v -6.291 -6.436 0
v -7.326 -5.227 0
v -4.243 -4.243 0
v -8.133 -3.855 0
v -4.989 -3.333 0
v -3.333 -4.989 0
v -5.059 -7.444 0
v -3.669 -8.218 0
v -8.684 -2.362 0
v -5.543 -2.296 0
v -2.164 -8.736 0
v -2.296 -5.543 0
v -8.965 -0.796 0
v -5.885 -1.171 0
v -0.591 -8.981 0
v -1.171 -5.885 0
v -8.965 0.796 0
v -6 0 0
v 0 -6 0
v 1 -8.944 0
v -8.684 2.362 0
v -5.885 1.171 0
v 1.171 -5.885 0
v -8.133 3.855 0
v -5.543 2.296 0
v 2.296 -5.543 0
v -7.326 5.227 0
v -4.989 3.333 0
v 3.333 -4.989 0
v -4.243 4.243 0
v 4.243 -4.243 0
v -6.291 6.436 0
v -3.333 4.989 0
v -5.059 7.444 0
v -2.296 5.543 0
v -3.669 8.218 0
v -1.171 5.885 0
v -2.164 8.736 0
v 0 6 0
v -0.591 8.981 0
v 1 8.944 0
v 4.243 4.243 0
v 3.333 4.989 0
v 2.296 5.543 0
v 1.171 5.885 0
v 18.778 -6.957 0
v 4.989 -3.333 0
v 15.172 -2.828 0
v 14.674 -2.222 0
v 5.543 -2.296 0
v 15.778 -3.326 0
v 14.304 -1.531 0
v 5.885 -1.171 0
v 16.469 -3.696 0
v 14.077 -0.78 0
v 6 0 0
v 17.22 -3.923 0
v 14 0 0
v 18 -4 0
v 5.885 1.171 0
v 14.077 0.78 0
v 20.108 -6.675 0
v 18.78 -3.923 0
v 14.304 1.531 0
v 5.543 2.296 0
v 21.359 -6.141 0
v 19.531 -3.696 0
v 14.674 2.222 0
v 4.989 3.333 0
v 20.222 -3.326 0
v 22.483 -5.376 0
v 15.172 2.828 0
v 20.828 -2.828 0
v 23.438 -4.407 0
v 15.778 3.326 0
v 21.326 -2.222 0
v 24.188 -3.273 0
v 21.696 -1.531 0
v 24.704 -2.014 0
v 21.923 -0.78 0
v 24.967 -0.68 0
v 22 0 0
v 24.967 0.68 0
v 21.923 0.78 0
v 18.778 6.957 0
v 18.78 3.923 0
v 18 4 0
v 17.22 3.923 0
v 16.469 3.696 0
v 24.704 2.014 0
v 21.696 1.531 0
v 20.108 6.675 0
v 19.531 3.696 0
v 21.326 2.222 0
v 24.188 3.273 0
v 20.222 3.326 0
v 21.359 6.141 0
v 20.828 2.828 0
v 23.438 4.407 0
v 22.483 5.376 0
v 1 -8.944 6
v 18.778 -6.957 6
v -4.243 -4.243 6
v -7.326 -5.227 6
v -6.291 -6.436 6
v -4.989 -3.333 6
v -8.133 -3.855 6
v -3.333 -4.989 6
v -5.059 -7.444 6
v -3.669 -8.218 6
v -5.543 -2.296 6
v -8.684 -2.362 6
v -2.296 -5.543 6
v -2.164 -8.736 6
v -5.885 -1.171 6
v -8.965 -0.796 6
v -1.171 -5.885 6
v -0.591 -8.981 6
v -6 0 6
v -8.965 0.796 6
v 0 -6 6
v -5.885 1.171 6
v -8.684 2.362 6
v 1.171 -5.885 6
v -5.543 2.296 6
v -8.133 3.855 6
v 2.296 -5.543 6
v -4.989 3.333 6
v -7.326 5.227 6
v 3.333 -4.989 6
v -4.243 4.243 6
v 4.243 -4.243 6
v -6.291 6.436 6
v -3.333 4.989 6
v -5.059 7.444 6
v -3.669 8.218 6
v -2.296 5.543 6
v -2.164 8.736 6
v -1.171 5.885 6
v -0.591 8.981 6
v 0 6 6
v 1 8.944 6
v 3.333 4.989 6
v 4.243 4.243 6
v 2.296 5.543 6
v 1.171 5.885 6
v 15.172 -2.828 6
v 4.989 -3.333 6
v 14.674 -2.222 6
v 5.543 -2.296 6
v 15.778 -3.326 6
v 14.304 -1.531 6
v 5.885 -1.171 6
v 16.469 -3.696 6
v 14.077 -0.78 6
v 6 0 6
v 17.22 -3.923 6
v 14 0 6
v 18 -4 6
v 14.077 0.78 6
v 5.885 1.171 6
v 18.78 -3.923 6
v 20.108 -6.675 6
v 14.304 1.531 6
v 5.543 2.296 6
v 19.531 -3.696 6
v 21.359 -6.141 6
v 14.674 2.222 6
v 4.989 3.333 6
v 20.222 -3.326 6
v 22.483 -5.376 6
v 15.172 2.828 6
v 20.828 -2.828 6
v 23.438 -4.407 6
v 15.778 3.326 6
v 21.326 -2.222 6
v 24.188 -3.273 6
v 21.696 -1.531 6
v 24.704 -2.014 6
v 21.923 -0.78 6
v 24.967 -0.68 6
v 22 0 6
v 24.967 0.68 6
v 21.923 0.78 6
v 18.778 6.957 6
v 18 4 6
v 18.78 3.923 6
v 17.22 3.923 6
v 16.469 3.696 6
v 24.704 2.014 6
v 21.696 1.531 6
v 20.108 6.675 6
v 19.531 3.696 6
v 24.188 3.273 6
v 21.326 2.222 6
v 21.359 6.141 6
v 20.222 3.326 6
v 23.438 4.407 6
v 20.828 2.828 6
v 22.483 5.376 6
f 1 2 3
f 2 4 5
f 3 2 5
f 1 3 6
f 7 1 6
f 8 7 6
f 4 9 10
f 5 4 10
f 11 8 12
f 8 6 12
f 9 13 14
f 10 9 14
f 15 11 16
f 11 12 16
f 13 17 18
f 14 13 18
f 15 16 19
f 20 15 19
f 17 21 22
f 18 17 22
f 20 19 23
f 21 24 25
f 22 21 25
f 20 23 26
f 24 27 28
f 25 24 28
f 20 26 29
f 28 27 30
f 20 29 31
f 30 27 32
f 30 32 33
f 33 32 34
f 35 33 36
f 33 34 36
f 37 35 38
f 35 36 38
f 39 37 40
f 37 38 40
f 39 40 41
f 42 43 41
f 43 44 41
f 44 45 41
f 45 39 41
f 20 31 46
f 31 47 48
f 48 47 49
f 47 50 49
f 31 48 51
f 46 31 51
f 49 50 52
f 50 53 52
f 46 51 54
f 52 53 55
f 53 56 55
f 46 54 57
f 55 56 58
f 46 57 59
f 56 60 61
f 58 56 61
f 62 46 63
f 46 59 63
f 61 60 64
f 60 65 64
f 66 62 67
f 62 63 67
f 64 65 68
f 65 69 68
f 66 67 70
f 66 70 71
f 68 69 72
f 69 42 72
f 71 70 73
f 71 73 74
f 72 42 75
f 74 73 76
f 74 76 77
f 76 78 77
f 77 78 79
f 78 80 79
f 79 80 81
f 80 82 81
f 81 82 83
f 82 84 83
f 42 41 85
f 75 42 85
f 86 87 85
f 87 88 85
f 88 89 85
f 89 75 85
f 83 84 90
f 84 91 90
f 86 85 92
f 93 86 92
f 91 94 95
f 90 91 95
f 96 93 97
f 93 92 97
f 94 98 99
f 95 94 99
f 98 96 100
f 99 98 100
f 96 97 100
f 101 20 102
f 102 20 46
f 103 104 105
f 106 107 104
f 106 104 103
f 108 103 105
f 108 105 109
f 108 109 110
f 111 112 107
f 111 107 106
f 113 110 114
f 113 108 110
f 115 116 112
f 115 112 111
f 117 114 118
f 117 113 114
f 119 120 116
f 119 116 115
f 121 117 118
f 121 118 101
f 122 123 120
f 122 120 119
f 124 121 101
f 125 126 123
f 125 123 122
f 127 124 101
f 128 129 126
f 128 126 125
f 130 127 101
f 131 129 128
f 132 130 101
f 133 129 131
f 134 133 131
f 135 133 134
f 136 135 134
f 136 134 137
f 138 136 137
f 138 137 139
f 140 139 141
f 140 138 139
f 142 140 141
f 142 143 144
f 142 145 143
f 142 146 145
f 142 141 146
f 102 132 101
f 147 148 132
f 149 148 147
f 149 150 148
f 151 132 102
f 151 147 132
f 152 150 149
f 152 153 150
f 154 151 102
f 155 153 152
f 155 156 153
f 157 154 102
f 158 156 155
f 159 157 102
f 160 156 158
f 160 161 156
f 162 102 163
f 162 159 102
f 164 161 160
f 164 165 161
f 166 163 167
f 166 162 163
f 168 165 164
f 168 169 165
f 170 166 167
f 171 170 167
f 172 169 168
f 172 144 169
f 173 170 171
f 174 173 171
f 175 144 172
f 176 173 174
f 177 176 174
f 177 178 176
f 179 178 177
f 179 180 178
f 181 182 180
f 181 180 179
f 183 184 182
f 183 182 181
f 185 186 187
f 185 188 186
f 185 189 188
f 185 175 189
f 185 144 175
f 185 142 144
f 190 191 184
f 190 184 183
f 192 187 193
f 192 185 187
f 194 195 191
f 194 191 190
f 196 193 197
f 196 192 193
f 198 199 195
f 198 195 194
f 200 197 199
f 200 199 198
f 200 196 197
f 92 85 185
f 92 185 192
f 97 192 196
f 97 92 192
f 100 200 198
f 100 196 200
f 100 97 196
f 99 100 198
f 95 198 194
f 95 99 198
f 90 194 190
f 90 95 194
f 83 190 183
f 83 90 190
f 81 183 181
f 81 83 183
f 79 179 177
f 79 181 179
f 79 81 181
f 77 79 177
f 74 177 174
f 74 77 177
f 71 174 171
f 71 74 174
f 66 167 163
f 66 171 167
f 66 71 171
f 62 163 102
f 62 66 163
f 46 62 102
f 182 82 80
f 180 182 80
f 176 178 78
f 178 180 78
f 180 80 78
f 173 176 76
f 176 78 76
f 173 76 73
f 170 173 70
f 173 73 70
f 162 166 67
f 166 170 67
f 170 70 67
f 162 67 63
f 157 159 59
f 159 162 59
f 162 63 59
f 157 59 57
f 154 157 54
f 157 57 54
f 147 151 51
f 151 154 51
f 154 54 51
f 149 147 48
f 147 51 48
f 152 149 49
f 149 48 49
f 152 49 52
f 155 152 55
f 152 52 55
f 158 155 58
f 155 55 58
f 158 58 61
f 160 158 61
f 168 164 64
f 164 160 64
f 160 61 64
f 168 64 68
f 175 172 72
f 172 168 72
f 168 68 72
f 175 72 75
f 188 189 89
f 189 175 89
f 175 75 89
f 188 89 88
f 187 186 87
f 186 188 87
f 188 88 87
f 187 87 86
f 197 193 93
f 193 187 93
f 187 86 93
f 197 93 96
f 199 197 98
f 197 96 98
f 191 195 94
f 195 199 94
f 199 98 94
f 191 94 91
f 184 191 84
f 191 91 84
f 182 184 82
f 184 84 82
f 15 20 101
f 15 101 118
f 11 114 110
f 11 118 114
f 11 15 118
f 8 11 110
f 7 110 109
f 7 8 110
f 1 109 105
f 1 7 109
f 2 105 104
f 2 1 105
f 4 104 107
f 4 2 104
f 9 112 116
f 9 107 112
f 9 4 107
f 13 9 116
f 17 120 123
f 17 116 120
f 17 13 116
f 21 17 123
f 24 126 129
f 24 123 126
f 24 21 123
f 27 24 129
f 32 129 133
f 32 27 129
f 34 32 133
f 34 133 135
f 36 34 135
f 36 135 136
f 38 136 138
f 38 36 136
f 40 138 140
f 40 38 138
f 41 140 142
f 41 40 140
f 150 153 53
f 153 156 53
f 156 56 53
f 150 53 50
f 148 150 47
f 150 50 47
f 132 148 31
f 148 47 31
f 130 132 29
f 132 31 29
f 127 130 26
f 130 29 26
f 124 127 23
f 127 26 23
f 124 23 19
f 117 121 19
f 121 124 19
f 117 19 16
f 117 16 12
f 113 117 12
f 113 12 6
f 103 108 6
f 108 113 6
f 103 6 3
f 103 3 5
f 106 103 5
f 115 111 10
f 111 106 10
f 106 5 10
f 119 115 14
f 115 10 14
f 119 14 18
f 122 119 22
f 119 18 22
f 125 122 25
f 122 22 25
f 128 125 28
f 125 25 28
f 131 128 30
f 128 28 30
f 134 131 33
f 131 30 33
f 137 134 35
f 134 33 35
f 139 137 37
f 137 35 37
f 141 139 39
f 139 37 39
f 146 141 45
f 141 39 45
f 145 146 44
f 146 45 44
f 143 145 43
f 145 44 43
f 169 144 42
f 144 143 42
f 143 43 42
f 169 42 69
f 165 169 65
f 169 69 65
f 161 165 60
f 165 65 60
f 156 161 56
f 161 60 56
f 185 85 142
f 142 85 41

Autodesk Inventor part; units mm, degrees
ref_plane "YZ Plane" through (0, 0, 0) normal (1, 0, 0) x (0, 1, 0)
ref_plane "XZ Plane" through (0, 0, 0) normal (0, 1, 0) x (-1, 0, 0)
ref_plane "XY Plane" through (0, 0, 0) normal (0, 0, 1) x (1, 0, 0)
sketch "Эскиз1" plane through (0, 0, 0) normal (0, 0, 1) x (1, 0, 0)
  circle A0 centre (0, 0) radius 6
  circle A1 centre (18, 0) radius 4
  line L0 (0, 0) -> (18, 0)
  line L1 (0, 0) -> (18, 0) construction
  line L2 (1, -8.9443) -> (18.7778, -6.9567)
  line L3 (18.7778, 6.9567) -> (1, 8.9443)
  arc A2 (1, 8.9443) -> (1, -8.9443) centre (0, 0) ccw
  arc A3 (18.7778, -6.9567) -> (18.7778, 6.9567) centre (18, 0) ccw
  point P0 (9, 0)
  dimension "d0" = 12
  dimension "d1" = 8
  dimension "d2" = 18
  dimension "d4" = 9
  dimension "d7" = 7
extrude "Выдавливание1" add sketch "Эскиз1" along normal blind 6
properties part number "Крепление петли"
